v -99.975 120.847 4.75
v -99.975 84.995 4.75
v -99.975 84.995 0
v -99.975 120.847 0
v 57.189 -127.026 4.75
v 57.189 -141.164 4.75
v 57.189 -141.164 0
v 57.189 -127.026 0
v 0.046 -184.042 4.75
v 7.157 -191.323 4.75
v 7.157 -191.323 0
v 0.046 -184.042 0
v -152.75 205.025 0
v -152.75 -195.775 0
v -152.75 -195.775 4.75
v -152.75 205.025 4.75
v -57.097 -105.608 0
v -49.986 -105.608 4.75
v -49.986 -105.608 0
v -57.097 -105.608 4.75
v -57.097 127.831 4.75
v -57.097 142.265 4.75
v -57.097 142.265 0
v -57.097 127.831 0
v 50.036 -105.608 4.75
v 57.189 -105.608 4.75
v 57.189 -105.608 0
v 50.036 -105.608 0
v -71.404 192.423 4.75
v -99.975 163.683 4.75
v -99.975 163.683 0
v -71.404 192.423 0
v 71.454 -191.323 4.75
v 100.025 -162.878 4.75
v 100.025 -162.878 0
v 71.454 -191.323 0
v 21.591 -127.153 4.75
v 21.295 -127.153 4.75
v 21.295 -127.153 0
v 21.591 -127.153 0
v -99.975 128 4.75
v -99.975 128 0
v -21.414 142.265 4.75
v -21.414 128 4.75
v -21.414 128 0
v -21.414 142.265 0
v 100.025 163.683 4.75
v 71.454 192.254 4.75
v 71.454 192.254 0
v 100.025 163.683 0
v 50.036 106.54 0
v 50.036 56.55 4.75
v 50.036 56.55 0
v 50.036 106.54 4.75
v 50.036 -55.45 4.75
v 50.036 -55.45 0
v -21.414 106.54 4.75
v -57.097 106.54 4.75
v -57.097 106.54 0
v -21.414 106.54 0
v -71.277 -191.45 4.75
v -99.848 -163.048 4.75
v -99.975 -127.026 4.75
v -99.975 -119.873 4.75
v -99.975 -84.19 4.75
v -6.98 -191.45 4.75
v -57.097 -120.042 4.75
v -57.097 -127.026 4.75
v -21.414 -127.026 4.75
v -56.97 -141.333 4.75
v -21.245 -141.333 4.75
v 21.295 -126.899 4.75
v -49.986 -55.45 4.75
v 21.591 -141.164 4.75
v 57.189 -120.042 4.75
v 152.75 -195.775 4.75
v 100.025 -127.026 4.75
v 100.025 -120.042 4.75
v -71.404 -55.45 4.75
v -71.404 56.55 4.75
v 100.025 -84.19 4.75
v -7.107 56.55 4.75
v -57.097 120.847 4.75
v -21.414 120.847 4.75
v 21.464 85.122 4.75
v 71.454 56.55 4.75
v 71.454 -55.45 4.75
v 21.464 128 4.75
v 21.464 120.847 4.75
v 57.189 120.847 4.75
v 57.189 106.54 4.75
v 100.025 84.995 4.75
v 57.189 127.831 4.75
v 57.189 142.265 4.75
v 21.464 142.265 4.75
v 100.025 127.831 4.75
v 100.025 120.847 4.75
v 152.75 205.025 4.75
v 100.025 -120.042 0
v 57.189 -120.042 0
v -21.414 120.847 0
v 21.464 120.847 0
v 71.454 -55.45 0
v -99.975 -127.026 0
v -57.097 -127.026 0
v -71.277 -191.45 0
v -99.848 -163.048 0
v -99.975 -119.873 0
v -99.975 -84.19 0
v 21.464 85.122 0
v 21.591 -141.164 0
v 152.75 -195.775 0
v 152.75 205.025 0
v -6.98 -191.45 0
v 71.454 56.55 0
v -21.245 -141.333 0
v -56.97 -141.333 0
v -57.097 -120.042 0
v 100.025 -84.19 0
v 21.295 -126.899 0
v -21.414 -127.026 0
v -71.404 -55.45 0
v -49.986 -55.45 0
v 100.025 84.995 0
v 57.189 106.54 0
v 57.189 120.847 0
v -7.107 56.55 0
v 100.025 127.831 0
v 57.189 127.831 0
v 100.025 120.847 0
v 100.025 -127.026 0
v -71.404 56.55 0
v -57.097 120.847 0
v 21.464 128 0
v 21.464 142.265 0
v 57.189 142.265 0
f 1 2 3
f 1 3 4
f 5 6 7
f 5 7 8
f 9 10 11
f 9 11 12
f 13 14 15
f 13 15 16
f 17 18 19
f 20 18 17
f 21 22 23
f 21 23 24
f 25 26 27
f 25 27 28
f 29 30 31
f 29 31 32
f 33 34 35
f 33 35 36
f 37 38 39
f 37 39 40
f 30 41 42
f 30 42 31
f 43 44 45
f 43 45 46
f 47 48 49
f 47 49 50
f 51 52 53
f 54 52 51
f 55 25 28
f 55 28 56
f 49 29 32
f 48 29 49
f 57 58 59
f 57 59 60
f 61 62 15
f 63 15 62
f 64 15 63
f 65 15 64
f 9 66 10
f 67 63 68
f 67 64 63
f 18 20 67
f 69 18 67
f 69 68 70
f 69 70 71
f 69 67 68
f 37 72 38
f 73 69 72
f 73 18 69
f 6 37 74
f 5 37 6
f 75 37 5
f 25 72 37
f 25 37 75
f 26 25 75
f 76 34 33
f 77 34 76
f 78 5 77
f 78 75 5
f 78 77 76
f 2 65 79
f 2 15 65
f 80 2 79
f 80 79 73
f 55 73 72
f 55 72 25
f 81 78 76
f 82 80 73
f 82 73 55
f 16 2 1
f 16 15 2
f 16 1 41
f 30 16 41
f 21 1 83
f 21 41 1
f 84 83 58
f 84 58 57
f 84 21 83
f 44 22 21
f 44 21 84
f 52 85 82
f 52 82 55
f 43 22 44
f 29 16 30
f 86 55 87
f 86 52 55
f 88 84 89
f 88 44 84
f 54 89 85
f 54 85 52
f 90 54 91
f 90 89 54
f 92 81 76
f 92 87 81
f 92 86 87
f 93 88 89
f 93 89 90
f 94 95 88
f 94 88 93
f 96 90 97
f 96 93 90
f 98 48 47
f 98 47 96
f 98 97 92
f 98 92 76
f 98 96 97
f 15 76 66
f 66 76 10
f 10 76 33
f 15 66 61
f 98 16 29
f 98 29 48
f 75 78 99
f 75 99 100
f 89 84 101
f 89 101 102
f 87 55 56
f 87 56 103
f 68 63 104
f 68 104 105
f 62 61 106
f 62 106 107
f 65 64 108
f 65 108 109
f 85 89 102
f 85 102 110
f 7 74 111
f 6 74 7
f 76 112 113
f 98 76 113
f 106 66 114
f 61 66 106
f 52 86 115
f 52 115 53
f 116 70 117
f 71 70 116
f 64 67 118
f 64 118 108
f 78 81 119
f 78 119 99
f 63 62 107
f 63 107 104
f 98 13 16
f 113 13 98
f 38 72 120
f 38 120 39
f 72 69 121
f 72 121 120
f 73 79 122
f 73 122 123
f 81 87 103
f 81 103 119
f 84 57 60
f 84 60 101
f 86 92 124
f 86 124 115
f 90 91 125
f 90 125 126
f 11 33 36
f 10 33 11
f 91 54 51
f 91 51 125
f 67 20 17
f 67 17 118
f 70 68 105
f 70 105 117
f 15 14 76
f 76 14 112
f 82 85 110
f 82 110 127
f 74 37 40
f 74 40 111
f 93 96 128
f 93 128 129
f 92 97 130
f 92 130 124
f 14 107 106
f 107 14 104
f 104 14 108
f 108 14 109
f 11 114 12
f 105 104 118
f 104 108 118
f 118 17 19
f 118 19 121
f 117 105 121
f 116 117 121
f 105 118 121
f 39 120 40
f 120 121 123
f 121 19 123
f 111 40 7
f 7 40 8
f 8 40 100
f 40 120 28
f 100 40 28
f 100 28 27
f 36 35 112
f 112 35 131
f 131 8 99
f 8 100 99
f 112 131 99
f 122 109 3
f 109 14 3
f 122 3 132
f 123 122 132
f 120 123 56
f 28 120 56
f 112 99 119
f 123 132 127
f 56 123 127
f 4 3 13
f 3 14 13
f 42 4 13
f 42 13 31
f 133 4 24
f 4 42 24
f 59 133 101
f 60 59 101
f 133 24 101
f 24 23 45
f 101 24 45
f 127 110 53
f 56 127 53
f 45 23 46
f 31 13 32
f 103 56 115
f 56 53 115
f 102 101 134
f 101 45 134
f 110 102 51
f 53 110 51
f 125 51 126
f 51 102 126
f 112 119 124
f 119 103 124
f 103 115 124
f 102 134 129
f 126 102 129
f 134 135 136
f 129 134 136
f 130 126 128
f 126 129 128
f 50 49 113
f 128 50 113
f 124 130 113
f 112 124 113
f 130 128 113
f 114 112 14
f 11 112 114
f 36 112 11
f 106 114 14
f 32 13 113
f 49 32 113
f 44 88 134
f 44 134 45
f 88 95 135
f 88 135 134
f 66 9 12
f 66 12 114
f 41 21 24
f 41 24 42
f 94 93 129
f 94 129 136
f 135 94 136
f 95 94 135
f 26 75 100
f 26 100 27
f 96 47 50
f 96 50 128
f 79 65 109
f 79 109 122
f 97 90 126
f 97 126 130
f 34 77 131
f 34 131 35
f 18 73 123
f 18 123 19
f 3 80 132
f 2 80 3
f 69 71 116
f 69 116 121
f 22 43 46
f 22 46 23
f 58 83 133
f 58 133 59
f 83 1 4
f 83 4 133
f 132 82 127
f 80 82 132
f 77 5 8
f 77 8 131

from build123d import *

# Parameters (mm, degrees)
SKETCH_1_W                 = 305.5
SKETCH_1_H                 = 1221.15
EXTRUDE_1_DEPTH            = 4.75
CUT_EXTRUDE_2_DEPTH        = 4.75
SPLIT_START                = 205.025
SPLIT_BODIES_2_OUTLINE_W   = 305.5
SPLIT_BODIES_2_OUTLINE_H   = 4.75
SPLIT_BODIES_2_DEPTH       = 405.55
SPLIT_START_2              = -610.575
SPLIT_BODIES_2_2_OUTLINE_W = 305.5
SPLIT_BODIES_2_2_OUTLINE_H = 4.75
SPLIT_BODIES_2_2_DEPTH     = 414.8


# Read off the part's stored shape, not the designer's step: 分割2
with BuildPart() as part:
    # 草圖1 → 填料-伸長1 (new body)
    with BuildSketch(Plane.XY):
        Rectangle(SKETCH_1_W, SKETCH_1_H)
    extrude(amount=EXTRUDE_1_DEPTH)

    # 草圖2 → 除料-伸長2 (cut)
    with BuildSketch(Plane.XY.offset(4.75)):
        Polygon((100.025, 354.412698413), (100.025, 304.423280423), (-83.25542328, 382.984126984), (-99.975, 390.137566138), (-99.975, 440.126984127), (83.30542328, 361.566137566), align=None)
        Polygon((57.189021164, 380.021164021), (57.189021164, 440.126984127), (100.025, 440.126984127), (100.025, 361.566137566), align=None)
        Polygon((50.035582011, 106.53968254), (57.189021164, 106.53968254), (57.189021164, 120.846560847), (100.025, 120.846560847), (100.025, 84.994708995), (71.453571429, 56.55026455), (50.035582011, 56.55026455), align=None)
        Polygon((-71.403571429, 56.55026455), (-99.975, 84.994708995), (-99.975, 120.846560847), (-57.096693122, 120.846560847), (-57.096693122, 106.53968254), (-21.414153439, 106.53968254), (-21.414153439, 120.846560847), (21.464153439, 120.846560847), (21.464153439, 85.121693122), (-7.107275132, 56.55026455), align=None)
        Polygon((-21.414153439, 142.264550265), (-57.096693122, 142.264550265), (-57.096693122, 127.830687831), (-99.975, 128), (-99.975, 163.682539683), (-71.403571429, 192.423280423), (71.453571429, 192.253968254), (100.025, 163.682539683), (100.025, 127.830687831), (57.189021164, 127.830687831), (57.189021164, 142.264550265), (21.464153439, 142.264550265), (21.464153439, 128), (-21.414153439, 128), align=None)
        Polygon((21.591137566, -141.164021164), (57.189021164, -141.164021164), (57.189021164, -127.026455026), (100.025, -127.026455026), (100.025, -162.878306878), (71.453571429, -191.322751323), (7.157275132, -191.322751323), (0.046164021, -184.042328042), (-6.980291005, -191.44973545), (-71.276587302, -191.44973545), (-99.848015873, -163.047619048), (-99.975, -127.026455026), (-57.096693122, -127.026455026), (-56.969708995, -141.333333333), (-21.24484127, -141.333333333), (-21.414153439, -127.026455026), (21.29484127, -126.899470899), (21.29484127, -127.153439153), (21.591137566, -127.153439153), align=None)
        Polygon((50.035582011, -55.44973545), (71.453571429, -55.44973545), (100.025, -84.19047619), (100.025, -120.042328042), (57.189021164, -120.042328042), (57.189021164, -105.608465608), (50.035582011, -105.608465608), align=None)
        Polygon((-49.985582011, -105.608465608), (-57.096693122, -105.608465608), (-57.096693122, -120.042328042), (-99.975, -119.873015873), (-99.975, -84.19047619), (-71.403571429, -55.44973545), (-49.985582011, -55.44973545), align=None)
        Polygon((50.035582011, -389.206349206), (57.189021164, -389.206349206), (57.189021164, -374.899470899), (100.025, -374.899470899), (100.025, -410.751322751), (71.453571429, -439.195767196), (50.035582011, -439.195767196), align=None)
        Polygon((-71.403571429, -439.195767196), (-99.975, -410.751322751), (-99.975, -374.899470899), (-57.096693122, -374.899470899), (-57.096693122, -389.206349206), (-21.414153439, -389.206349206), (-21.414153439, -374.899470899), (21.464153439, -374.899470899), (21.464153439, -410.624338624), (-7.107275132, -439.195767196), align=None)
        Polygon((-21.414153439, -353.481481481), (-57.096693122, -353.481481481), (-57.096693122, -367.915343915), (-99.975, -367.746031746), (-99.975, -332.063492063), (-71.403571429, -303.322751323), (71.453571429, -303.492063492), (100.025, -332.063492063), (100.025, -367.915343915), (57.189021164, -367.915343915), (57.189021164, -353.481481481), (21.464153439, -353.481481481), (21.464153439, -367.746031746), (-21.414153439, -367.746031746), align=None)
    extrude(amount=-CUT_EXTRUDE_2_DEPTH, mode=Mode.SUBTRACT)

    # Split Bodies 2 outline → Split Bodies 2 (cut)
    with BuildSketch(Plane(origin=(0, 0, 0), x_dir=(1, 0, 0), z_dir=(0, 1, 0)).offset(SPLIT_START)):
        with Locations((0, -2.375)):
            Rectangle(SPLIT_BODIES_2_OUTLINE_W, SPLIT_BODIES_2_OUTLINE_H)
    extrude(amount=SPLIT_BODIES_2_DEPTH, mode=Mode.SUBTRACT)

    # Split Bodies 2 2 outline → Split Bodies 2 2 (cut)
    with BuildSketch(Plane(origin=(0, 0, 0), x_dir=(1, 0, 0), z_dir=(0, 1, 0)).offset(SPLIT_START_2)):
        with Locations((0, -2.375)):
            Rectangle(SPLIT_BODIES_2_2_OUTLINE_W, SPLIT_BODIES_2_2_OUTLINE_H)
    extrude(amount=SPLIT_BODIES_2_2_DEPTH, mode=Mode.SUBTRACT)


solid = part.part
